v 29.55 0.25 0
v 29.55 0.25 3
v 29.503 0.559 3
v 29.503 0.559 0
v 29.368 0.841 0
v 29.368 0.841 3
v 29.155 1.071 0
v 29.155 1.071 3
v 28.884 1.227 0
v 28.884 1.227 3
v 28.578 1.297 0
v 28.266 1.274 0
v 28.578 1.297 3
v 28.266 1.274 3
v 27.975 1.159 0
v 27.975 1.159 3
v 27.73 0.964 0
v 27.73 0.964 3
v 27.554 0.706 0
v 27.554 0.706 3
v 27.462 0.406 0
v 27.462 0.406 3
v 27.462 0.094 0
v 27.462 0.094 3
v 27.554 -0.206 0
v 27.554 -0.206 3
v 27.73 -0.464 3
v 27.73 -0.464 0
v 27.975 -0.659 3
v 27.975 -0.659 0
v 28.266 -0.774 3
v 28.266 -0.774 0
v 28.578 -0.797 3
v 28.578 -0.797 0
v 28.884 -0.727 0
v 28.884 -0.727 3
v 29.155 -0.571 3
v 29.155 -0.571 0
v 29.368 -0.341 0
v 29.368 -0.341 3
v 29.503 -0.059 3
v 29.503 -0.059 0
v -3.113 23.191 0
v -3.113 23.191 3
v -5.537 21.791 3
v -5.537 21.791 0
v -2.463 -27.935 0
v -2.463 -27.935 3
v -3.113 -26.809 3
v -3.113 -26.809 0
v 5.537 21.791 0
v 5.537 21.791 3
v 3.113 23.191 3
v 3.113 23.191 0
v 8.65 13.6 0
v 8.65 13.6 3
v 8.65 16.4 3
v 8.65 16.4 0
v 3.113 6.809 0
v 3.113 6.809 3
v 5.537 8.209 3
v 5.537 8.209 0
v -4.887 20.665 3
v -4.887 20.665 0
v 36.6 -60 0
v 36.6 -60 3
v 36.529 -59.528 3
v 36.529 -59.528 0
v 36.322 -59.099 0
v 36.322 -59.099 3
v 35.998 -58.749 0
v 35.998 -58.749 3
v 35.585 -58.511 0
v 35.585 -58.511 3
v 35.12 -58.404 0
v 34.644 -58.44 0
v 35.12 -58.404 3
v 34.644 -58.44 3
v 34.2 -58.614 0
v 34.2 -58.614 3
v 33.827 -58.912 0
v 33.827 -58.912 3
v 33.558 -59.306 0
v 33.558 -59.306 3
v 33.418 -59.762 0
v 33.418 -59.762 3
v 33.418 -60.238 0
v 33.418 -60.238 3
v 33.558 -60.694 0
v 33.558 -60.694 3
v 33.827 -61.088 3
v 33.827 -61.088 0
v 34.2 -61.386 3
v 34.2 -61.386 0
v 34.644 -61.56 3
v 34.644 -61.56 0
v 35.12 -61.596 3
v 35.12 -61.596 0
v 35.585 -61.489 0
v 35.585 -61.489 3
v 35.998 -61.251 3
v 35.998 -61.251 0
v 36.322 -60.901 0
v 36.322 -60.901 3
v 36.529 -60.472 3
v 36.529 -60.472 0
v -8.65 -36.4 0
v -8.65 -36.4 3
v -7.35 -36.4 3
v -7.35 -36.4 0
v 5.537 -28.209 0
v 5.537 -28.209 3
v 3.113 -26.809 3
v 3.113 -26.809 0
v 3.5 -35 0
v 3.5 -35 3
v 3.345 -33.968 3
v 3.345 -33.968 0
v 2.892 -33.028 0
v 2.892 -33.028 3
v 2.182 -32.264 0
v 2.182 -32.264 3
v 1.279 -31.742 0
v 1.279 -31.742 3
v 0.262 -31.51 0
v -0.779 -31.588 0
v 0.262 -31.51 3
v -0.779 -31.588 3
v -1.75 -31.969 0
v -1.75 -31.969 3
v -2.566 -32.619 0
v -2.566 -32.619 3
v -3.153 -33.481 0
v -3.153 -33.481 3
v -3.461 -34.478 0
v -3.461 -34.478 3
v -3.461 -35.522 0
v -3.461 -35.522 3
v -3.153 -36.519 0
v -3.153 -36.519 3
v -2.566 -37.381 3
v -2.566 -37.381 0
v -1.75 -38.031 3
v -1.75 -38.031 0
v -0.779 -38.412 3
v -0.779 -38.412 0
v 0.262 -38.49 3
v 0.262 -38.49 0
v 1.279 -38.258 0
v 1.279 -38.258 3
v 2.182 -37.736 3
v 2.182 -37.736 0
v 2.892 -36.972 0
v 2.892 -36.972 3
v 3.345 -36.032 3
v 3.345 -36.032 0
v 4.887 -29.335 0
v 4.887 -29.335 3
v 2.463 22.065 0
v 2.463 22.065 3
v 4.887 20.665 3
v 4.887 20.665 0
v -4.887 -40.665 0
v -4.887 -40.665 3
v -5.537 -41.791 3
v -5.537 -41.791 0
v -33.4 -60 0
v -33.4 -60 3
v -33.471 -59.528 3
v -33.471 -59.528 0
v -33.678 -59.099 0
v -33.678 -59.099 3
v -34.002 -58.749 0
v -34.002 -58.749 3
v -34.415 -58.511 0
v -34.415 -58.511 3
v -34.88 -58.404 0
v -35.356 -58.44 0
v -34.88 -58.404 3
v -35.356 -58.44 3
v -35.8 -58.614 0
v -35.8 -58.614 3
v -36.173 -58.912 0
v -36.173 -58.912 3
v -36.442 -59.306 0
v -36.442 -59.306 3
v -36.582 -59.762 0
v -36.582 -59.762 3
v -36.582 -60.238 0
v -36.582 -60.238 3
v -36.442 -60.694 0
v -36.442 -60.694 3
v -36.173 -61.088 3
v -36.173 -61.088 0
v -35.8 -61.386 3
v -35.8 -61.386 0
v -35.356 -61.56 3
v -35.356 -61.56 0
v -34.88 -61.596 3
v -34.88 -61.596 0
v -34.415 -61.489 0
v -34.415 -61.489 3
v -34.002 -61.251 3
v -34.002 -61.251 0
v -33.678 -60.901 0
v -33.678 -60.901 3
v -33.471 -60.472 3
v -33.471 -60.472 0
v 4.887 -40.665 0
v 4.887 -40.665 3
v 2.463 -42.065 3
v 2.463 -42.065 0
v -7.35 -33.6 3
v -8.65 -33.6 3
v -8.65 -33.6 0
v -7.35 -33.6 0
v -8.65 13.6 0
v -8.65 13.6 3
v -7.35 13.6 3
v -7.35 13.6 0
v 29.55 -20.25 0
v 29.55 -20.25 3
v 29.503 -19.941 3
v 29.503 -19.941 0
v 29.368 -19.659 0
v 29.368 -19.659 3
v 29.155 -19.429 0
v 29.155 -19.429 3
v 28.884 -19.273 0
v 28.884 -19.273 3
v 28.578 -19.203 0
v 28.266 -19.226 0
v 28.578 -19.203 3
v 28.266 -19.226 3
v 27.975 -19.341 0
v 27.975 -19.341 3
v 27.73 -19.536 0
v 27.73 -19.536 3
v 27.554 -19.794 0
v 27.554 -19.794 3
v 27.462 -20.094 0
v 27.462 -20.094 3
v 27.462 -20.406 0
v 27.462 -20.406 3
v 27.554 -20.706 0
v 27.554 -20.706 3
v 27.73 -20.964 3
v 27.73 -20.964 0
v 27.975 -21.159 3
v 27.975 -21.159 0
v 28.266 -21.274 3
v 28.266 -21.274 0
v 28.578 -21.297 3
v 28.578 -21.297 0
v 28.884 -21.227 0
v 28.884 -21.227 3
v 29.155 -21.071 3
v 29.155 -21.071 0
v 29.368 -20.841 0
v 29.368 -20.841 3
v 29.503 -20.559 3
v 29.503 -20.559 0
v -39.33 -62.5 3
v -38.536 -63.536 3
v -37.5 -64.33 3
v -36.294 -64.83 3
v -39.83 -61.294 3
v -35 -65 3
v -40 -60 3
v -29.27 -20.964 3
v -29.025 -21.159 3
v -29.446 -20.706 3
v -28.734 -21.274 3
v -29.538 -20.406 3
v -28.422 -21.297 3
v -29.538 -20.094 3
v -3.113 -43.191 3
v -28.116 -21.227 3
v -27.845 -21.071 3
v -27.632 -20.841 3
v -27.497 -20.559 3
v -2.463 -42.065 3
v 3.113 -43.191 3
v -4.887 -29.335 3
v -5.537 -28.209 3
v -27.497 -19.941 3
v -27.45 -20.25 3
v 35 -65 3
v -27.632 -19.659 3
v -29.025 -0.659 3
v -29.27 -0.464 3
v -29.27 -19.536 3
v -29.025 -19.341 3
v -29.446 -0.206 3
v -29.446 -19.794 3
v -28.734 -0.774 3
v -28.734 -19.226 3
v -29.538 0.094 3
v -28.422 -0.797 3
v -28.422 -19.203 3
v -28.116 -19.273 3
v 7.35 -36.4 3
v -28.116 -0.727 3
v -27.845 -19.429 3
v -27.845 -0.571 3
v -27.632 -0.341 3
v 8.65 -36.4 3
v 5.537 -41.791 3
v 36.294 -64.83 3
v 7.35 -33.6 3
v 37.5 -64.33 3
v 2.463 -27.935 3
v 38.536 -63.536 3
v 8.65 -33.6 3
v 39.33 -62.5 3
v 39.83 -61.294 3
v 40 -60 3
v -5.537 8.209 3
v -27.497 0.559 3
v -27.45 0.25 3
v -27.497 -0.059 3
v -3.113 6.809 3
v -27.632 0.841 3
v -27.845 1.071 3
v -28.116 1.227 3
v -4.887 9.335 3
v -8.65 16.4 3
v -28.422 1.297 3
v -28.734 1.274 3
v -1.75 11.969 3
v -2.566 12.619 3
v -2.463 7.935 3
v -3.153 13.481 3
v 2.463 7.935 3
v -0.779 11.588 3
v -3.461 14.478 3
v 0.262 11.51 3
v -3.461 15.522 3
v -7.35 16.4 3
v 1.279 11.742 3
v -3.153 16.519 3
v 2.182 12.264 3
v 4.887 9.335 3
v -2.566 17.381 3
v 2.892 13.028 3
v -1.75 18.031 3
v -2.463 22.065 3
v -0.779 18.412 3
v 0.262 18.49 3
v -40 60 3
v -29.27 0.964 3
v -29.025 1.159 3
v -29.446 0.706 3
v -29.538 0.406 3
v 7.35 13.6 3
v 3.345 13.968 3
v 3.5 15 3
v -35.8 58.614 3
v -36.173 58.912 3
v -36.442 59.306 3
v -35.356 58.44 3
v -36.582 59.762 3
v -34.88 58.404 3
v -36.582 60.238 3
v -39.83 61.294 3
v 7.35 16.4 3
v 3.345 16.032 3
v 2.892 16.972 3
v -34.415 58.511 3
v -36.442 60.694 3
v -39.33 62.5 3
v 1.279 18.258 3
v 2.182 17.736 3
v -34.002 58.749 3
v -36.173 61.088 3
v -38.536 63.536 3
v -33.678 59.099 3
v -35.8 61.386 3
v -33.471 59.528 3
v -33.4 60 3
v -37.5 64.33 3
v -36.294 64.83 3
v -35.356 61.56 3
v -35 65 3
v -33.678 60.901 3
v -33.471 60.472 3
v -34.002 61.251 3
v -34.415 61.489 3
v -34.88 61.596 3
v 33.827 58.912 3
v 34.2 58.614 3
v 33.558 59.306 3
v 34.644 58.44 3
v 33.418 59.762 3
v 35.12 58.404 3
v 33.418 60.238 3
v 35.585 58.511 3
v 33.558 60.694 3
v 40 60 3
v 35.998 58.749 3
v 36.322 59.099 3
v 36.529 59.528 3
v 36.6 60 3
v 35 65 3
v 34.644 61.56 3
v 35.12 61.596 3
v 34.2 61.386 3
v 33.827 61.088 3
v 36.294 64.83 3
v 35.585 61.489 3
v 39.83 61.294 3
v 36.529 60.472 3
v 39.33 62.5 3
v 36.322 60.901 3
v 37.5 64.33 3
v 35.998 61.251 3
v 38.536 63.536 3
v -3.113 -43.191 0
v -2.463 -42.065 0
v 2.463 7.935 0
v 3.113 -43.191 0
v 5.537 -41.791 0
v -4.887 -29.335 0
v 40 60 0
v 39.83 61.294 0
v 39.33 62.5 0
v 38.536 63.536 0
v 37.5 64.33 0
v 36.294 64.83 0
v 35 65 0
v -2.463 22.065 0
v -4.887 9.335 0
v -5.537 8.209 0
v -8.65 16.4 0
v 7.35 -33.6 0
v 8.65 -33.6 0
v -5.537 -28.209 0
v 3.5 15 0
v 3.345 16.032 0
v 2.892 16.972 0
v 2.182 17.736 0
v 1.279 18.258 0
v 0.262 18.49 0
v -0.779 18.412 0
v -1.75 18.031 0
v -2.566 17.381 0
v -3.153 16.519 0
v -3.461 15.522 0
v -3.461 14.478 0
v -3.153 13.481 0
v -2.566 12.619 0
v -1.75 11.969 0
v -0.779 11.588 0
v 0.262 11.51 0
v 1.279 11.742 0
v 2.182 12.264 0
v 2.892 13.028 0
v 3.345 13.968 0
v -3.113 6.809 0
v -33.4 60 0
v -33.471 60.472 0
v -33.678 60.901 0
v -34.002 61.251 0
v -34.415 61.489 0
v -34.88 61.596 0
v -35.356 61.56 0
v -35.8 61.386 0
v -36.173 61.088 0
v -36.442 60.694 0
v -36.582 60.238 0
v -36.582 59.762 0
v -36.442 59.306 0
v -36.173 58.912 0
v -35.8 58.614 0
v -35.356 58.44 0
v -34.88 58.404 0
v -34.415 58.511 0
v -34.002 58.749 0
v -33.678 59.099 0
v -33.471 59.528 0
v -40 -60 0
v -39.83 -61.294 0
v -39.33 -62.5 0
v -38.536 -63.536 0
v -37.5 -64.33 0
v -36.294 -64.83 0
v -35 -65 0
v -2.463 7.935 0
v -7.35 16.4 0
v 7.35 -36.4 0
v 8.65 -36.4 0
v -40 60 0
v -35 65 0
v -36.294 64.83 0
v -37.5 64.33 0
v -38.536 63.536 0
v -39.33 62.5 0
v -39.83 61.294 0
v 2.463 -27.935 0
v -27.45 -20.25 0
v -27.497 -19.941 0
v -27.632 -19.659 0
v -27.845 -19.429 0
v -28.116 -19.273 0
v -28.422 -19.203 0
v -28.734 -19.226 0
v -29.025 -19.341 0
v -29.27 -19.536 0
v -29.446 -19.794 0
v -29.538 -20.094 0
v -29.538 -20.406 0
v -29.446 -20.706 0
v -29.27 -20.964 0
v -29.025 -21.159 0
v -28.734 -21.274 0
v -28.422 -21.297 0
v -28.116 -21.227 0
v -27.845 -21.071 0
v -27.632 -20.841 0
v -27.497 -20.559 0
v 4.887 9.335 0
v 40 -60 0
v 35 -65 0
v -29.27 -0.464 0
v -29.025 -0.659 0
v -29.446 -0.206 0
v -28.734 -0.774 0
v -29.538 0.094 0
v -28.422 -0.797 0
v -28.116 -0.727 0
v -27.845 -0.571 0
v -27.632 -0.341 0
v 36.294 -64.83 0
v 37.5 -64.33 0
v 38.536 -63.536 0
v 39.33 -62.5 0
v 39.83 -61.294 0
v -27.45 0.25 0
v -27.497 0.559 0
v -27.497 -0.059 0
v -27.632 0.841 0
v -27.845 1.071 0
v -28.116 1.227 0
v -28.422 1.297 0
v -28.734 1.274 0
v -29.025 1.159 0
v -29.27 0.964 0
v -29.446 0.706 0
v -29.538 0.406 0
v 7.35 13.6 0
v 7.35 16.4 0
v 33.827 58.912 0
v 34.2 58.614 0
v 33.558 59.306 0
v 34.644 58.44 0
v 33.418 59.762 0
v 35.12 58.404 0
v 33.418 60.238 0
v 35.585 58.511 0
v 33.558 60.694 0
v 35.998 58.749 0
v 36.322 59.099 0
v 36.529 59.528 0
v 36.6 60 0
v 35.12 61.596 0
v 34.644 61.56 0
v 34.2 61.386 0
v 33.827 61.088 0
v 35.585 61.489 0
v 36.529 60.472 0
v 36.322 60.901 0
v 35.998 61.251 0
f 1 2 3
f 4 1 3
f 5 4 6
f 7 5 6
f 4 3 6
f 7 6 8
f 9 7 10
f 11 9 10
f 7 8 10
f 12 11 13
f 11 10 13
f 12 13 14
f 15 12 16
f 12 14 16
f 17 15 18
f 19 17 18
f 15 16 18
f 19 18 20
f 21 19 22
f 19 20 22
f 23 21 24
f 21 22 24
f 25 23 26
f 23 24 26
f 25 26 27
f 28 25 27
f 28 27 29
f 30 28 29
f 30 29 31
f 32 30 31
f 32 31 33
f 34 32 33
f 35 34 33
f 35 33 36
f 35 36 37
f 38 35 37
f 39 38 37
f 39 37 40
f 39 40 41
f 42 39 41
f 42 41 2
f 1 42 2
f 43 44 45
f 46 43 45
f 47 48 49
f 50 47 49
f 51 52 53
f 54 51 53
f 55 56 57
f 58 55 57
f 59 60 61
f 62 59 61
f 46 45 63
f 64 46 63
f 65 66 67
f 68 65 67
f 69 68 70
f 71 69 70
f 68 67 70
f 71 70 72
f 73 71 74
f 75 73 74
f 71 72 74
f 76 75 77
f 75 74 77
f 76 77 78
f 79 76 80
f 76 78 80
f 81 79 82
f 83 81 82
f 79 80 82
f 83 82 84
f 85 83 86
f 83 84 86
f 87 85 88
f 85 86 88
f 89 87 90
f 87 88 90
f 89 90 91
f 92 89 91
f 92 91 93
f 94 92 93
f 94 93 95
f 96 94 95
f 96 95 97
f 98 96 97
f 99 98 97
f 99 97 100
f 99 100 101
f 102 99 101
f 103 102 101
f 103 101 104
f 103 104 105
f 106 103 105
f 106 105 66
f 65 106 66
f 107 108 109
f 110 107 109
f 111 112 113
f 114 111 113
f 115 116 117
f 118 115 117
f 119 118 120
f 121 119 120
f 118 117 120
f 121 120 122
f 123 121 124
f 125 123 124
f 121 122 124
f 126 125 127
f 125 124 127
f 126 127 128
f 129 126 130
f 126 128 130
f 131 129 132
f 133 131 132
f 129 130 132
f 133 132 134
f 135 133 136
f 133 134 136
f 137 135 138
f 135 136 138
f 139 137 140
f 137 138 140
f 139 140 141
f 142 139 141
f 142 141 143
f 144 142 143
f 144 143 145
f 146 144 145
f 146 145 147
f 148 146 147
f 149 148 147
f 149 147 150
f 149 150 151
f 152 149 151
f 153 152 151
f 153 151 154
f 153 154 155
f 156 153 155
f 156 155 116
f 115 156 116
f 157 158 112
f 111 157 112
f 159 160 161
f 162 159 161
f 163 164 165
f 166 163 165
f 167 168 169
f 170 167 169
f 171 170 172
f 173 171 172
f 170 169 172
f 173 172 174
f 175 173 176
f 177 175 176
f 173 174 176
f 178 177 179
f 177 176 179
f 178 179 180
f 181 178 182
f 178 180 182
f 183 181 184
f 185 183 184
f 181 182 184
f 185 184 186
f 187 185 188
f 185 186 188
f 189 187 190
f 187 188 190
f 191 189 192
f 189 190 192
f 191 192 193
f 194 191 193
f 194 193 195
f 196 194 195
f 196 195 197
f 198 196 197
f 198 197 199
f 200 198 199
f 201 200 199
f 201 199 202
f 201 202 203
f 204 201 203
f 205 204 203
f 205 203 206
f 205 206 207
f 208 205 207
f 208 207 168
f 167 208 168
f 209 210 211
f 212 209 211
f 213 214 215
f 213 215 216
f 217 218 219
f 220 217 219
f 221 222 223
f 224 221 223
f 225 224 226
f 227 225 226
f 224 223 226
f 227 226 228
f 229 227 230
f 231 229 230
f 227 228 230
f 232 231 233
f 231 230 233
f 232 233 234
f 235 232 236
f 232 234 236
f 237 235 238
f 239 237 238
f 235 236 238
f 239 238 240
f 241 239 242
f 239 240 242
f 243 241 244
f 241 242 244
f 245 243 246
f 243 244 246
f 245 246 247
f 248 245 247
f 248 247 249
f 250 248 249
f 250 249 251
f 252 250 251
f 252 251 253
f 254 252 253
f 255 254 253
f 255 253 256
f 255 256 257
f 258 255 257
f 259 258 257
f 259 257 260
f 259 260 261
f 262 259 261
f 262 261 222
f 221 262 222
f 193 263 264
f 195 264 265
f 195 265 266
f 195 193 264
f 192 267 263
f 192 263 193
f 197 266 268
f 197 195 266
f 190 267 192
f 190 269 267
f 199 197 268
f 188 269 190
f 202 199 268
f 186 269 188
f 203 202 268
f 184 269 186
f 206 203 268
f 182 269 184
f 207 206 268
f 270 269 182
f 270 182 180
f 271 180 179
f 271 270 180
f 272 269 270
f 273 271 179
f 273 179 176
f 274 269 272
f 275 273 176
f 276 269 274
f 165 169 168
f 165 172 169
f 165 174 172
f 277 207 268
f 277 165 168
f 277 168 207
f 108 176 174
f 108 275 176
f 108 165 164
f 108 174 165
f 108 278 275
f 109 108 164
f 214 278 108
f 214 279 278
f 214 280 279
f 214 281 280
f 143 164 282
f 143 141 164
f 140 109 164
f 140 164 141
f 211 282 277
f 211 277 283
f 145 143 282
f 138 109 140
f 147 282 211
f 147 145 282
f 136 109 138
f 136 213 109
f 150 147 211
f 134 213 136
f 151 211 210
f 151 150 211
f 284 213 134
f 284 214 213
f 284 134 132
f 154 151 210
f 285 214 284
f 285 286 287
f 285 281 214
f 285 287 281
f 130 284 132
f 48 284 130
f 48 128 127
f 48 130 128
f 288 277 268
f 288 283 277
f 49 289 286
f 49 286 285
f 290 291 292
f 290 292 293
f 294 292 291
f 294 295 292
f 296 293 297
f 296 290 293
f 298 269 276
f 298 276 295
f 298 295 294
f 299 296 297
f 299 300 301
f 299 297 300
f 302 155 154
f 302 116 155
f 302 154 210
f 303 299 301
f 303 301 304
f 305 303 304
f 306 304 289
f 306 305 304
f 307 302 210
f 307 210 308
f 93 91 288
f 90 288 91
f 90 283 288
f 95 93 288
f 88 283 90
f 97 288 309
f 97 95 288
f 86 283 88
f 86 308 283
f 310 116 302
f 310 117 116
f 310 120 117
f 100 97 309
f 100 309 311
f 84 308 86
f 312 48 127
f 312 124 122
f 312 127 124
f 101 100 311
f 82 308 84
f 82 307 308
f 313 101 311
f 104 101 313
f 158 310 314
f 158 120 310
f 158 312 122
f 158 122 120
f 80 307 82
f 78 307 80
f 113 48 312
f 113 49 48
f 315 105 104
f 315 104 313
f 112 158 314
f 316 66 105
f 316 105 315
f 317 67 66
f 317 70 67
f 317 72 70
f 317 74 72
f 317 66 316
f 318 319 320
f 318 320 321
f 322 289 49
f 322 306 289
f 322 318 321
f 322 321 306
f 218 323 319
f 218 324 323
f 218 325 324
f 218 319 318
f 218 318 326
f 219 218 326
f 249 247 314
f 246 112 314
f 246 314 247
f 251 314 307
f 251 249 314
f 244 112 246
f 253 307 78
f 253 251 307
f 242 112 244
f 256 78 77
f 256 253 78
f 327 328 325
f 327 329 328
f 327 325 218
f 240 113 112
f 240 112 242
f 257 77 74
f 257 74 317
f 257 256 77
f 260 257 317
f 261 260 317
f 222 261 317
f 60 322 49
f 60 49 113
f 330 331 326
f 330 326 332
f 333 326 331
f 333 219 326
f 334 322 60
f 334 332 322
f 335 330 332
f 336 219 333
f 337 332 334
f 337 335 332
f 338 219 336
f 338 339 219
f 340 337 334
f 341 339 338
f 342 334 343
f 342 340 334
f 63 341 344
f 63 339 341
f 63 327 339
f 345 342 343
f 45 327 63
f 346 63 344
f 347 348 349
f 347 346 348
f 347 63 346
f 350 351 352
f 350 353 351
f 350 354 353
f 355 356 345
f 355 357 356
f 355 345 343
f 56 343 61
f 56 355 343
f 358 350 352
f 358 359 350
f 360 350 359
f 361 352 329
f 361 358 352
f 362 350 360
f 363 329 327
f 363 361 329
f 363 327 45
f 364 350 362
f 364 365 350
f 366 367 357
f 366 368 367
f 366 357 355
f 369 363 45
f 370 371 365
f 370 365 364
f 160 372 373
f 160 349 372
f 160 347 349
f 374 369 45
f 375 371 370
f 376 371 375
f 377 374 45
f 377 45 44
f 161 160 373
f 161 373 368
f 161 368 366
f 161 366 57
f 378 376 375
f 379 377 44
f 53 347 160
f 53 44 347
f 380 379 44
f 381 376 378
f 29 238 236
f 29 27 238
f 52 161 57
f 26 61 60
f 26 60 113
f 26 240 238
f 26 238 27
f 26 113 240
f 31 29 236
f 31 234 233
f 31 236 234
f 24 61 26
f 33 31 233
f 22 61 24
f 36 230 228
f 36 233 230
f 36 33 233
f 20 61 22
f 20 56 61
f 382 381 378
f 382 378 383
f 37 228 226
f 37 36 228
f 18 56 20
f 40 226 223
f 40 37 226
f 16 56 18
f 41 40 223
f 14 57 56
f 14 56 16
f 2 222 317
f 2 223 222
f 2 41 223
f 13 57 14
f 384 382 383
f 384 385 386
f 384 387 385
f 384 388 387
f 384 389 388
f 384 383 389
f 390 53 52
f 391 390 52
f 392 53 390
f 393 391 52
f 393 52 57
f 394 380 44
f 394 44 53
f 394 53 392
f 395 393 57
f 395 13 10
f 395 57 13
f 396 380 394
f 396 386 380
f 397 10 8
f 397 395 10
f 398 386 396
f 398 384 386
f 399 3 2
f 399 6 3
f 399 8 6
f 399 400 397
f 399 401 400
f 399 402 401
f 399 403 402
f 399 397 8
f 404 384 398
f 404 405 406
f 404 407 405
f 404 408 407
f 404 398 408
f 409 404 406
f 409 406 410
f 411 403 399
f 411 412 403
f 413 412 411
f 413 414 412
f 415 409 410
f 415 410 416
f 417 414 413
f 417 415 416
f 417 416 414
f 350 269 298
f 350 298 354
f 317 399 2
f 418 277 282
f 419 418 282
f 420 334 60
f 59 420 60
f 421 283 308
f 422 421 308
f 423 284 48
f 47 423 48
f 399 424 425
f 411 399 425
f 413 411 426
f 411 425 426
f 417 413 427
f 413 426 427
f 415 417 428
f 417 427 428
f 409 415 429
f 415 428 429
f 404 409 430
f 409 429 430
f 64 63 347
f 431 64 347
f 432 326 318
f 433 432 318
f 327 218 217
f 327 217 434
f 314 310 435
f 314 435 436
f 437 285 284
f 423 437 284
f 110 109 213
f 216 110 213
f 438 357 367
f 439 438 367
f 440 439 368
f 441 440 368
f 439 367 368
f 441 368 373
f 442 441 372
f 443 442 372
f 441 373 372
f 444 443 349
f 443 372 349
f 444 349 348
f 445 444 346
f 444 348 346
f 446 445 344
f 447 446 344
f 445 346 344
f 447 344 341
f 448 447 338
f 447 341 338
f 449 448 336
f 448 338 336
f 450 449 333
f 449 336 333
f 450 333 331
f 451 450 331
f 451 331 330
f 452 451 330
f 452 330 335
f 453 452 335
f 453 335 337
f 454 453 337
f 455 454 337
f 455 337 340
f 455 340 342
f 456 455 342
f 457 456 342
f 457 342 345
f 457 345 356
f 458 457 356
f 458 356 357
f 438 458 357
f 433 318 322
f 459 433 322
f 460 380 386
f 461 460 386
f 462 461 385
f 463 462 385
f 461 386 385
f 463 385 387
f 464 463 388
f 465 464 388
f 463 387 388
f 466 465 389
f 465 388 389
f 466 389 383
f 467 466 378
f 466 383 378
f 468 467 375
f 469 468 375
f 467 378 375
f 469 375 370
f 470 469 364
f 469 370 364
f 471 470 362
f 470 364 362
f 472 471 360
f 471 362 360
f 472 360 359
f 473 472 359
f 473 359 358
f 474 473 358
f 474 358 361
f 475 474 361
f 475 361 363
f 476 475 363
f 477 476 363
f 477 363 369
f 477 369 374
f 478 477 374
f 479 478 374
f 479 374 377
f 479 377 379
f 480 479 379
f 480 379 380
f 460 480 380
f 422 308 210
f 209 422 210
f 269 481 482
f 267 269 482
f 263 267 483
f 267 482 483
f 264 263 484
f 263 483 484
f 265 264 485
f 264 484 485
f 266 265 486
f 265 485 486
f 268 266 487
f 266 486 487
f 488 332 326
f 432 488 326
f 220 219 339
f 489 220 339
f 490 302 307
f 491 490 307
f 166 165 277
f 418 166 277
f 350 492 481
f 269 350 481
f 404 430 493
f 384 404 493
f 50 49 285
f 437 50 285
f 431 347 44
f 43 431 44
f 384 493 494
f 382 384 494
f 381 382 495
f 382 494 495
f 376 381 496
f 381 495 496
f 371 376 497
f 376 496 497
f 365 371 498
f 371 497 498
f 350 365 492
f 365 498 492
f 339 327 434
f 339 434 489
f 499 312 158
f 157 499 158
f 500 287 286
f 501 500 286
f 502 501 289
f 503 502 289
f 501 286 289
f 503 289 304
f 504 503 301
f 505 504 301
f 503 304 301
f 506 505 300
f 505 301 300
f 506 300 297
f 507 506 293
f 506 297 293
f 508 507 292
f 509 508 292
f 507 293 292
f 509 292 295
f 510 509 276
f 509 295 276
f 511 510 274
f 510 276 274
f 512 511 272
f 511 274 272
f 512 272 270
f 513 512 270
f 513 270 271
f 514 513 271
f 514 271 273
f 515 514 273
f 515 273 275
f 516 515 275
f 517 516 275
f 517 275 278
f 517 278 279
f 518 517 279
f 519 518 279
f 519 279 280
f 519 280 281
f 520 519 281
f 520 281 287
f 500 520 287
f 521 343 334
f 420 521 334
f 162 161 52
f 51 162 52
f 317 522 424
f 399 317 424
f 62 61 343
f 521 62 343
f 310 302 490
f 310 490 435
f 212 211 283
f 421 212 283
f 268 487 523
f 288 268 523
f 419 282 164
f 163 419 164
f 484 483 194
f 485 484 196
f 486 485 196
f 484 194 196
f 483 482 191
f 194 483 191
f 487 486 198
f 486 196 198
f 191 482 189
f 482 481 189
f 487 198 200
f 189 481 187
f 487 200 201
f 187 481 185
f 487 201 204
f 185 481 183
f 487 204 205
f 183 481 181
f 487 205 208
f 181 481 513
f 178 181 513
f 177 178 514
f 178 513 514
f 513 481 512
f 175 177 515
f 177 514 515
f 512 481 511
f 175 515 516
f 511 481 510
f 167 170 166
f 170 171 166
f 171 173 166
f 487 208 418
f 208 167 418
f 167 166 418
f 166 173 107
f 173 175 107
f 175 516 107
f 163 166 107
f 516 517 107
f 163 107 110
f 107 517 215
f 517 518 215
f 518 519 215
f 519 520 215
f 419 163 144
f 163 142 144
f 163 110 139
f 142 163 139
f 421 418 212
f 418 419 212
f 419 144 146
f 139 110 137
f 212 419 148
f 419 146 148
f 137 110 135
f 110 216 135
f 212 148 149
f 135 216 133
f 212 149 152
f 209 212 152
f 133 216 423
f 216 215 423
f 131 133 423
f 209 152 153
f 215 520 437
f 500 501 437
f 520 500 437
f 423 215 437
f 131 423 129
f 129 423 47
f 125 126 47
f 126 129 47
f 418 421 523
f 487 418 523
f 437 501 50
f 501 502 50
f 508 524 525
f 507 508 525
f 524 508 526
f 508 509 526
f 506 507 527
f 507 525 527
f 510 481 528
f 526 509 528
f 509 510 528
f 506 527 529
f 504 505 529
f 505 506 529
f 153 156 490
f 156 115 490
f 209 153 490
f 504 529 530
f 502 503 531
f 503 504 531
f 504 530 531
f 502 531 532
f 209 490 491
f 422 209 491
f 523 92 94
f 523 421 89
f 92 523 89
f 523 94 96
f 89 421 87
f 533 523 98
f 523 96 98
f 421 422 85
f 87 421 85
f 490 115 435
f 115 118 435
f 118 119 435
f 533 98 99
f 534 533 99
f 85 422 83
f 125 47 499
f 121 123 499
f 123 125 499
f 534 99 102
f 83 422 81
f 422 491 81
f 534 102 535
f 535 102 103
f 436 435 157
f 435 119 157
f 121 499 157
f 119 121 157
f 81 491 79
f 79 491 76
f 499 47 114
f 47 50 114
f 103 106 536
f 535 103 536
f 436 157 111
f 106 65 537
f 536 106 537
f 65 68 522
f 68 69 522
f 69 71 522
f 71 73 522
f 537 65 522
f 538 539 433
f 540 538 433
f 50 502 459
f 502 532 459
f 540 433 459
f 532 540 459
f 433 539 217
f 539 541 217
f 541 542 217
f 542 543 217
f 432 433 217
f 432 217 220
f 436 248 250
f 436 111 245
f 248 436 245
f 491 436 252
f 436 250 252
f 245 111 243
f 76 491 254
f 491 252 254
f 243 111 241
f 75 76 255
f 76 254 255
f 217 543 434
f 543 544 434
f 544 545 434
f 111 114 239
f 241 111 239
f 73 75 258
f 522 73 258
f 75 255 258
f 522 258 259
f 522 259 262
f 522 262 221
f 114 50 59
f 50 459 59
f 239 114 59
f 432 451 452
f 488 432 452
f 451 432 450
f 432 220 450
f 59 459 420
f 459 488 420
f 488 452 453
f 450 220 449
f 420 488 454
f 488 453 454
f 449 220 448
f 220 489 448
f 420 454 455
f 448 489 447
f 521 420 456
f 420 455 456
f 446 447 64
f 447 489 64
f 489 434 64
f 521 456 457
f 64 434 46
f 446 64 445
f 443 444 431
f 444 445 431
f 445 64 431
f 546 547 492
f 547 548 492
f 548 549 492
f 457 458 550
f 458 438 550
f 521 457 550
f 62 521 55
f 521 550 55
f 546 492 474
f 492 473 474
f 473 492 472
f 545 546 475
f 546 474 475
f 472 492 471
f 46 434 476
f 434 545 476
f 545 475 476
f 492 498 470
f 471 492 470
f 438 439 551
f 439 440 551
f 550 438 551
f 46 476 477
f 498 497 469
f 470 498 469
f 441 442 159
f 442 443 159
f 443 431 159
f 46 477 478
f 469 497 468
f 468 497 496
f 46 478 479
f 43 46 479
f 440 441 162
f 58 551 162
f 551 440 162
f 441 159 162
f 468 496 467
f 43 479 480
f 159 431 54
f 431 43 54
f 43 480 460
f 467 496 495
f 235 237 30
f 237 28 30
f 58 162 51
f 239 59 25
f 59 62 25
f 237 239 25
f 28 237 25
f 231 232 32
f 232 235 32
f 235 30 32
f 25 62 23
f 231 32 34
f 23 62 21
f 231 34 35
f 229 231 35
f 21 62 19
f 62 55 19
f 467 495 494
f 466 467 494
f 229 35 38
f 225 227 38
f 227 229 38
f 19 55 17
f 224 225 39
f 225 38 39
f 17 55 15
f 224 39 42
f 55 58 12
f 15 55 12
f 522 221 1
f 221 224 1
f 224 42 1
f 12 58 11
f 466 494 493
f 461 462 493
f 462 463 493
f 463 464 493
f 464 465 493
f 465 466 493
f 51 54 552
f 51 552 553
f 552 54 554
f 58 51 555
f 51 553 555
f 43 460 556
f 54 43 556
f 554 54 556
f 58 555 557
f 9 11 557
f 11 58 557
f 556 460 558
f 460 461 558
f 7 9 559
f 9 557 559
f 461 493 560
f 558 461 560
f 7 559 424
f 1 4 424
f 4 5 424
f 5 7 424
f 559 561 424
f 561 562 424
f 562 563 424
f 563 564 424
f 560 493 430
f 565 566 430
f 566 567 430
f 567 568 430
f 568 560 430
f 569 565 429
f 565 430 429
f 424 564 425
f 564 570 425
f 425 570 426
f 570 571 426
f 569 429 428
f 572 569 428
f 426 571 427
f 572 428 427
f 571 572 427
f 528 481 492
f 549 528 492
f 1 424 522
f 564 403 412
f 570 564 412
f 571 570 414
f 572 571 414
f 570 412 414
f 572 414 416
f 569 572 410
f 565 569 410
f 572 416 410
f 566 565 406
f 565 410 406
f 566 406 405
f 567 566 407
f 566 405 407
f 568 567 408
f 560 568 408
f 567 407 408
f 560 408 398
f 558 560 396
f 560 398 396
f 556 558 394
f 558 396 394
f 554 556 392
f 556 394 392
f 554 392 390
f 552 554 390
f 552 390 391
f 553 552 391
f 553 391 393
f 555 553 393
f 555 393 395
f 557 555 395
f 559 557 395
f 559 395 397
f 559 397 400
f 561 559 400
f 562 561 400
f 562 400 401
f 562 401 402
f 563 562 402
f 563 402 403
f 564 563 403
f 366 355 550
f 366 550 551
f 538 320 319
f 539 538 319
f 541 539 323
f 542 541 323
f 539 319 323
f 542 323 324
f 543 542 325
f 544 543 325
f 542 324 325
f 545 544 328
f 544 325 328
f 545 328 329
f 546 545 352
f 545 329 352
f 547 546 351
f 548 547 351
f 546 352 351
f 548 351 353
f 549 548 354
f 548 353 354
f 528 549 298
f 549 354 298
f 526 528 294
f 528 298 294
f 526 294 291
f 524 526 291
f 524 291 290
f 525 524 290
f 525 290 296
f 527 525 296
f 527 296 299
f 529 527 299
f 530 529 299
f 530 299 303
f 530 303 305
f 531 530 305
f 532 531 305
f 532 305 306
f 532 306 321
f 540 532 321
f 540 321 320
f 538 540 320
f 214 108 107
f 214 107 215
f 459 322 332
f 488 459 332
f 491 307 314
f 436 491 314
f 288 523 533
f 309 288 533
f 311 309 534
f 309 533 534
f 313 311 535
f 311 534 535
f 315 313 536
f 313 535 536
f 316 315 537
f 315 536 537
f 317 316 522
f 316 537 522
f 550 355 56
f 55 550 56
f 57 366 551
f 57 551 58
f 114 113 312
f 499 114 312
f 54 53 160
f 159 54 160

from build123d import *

# Parameters (mm, degrees)
F1_DEPTH = 3
F2_R     = 3.5
F2_W     = 1.3
F2_H     = 2.8
F3_DEPTH = 3.001
F4_R     = 1.05
F4_R_2   = 1.6
F5_DEPTH = 3.001


with BuildPart() as f1:
    # F0 (on Top) → F1 (new body)
    with BuildSketch(Plane.XY):
        with BuildLine():
            Line((35, 65), (-35, 65))
            ThreePointArc((-35, 65), (-38.535534, 63.535534), (-40, 60))
            Line((-40, 60), (-40, -60))
            ThreePointArc((-40, -60), (-38.535534, -63.535534), (-35, -65))
            Line((-35, -65), (35, -65))
            ThreePointArc((35, -65), (38.535534, -63.535534), (40, -60))
            Line((40, -60), (40, 60))
            ThreePointArc((40, 60), (38.535534, 63.535534), (35, 65))
        make_face()
    extrude(amount=F1_DEPTH)

    # F2 (on face) → F3 (cut, through all)
    with BuildSketch(Plane.XY.offset(3)):
        with Locations((0, 15)):
            Circle(F2_R)
        with Locations((0, -35)):
            Circle(F2_R)
        with Locations((-8, 15)):
            Rectangle(F2_W, F2_H)
        Polygon((-2.462564, 22.065287), (-3.112564, 23.19112), (-5.537436, 21.79112), (-4.887436, 20.665287), align=None)
        Polygon((4.887436, 20.665287), (5.537436, 21.79112), (3.112564, 23.19112), (2.462564, 22.065287), align=None)
        with Locations((8, 15)):
            Rectangle(F2_W, F2_H)
        Polygon((2.462564, 7.934713), (3.112564, 6.80888), (5.537436, 8.20888), (4.887436, 9.334713), align=None)
        Polygon((-4.887436, 9.334713), (-5.537436, 8.20888), (-3.112564, 6.80888), (-2.462564, 7.934713), align=None)
        with Locations((-8, -35)):
            Rectangle(F2_W, F2_H)
        Polygon((-4.887436, -40.665287), (-5.537436, -41.79112), (-3.112564, -43.19112), (-2.462564, -42.065287), align=None)
        Polygon((2.462564, -42.065287), (3.112564, -43.19112), (5.537436, -41.79112), (4.887436, -40.665287), align=None)
        with Locations((8, -35)):
            Rectangle(F2_W, F2_H)
        Polygon((4.887436, -29.334713), (5.537436, -28.20888), (3.112564, -26.80888), (2.462564, -27.934713), align=None)
        Polygon((-2.462564, -27.934713), (-3.112564, -26.80888), (-5.537436, -28.20888), (-4.887436, -29.334713), align=None)
    extrude(amount=-F3_DEPTH, mode=Mode.SUBTRACT)

    # F4 (on face) → F5 (cut, through all)
    with BuildSketch(Plane.XY.offset(3)):
        with Locations((-28.5, 0.25)):
            Circle(F4_R)
        with Locations((28.5, 0.25)):
            Circle(F4_R)
        with Locations((28.5, -20.25)):
            Circle(F4_R)
        with Locations((-28.5, -20.25)):
            Circle(F4_R)
        with Locations((-35, 60)):
            Circle(F4_R_2)
        with Locations((35, 60)):
            Circle(F4_R_2)
        with Locations((35, -60)):
            Circle(F4_R_2)
        with Locations((-35, -60)):
            Circle(F4_R_2)
    extrude(amount=-F5_DEPTH, mode=Mode.SUBTRACT)


solid = f1.part
